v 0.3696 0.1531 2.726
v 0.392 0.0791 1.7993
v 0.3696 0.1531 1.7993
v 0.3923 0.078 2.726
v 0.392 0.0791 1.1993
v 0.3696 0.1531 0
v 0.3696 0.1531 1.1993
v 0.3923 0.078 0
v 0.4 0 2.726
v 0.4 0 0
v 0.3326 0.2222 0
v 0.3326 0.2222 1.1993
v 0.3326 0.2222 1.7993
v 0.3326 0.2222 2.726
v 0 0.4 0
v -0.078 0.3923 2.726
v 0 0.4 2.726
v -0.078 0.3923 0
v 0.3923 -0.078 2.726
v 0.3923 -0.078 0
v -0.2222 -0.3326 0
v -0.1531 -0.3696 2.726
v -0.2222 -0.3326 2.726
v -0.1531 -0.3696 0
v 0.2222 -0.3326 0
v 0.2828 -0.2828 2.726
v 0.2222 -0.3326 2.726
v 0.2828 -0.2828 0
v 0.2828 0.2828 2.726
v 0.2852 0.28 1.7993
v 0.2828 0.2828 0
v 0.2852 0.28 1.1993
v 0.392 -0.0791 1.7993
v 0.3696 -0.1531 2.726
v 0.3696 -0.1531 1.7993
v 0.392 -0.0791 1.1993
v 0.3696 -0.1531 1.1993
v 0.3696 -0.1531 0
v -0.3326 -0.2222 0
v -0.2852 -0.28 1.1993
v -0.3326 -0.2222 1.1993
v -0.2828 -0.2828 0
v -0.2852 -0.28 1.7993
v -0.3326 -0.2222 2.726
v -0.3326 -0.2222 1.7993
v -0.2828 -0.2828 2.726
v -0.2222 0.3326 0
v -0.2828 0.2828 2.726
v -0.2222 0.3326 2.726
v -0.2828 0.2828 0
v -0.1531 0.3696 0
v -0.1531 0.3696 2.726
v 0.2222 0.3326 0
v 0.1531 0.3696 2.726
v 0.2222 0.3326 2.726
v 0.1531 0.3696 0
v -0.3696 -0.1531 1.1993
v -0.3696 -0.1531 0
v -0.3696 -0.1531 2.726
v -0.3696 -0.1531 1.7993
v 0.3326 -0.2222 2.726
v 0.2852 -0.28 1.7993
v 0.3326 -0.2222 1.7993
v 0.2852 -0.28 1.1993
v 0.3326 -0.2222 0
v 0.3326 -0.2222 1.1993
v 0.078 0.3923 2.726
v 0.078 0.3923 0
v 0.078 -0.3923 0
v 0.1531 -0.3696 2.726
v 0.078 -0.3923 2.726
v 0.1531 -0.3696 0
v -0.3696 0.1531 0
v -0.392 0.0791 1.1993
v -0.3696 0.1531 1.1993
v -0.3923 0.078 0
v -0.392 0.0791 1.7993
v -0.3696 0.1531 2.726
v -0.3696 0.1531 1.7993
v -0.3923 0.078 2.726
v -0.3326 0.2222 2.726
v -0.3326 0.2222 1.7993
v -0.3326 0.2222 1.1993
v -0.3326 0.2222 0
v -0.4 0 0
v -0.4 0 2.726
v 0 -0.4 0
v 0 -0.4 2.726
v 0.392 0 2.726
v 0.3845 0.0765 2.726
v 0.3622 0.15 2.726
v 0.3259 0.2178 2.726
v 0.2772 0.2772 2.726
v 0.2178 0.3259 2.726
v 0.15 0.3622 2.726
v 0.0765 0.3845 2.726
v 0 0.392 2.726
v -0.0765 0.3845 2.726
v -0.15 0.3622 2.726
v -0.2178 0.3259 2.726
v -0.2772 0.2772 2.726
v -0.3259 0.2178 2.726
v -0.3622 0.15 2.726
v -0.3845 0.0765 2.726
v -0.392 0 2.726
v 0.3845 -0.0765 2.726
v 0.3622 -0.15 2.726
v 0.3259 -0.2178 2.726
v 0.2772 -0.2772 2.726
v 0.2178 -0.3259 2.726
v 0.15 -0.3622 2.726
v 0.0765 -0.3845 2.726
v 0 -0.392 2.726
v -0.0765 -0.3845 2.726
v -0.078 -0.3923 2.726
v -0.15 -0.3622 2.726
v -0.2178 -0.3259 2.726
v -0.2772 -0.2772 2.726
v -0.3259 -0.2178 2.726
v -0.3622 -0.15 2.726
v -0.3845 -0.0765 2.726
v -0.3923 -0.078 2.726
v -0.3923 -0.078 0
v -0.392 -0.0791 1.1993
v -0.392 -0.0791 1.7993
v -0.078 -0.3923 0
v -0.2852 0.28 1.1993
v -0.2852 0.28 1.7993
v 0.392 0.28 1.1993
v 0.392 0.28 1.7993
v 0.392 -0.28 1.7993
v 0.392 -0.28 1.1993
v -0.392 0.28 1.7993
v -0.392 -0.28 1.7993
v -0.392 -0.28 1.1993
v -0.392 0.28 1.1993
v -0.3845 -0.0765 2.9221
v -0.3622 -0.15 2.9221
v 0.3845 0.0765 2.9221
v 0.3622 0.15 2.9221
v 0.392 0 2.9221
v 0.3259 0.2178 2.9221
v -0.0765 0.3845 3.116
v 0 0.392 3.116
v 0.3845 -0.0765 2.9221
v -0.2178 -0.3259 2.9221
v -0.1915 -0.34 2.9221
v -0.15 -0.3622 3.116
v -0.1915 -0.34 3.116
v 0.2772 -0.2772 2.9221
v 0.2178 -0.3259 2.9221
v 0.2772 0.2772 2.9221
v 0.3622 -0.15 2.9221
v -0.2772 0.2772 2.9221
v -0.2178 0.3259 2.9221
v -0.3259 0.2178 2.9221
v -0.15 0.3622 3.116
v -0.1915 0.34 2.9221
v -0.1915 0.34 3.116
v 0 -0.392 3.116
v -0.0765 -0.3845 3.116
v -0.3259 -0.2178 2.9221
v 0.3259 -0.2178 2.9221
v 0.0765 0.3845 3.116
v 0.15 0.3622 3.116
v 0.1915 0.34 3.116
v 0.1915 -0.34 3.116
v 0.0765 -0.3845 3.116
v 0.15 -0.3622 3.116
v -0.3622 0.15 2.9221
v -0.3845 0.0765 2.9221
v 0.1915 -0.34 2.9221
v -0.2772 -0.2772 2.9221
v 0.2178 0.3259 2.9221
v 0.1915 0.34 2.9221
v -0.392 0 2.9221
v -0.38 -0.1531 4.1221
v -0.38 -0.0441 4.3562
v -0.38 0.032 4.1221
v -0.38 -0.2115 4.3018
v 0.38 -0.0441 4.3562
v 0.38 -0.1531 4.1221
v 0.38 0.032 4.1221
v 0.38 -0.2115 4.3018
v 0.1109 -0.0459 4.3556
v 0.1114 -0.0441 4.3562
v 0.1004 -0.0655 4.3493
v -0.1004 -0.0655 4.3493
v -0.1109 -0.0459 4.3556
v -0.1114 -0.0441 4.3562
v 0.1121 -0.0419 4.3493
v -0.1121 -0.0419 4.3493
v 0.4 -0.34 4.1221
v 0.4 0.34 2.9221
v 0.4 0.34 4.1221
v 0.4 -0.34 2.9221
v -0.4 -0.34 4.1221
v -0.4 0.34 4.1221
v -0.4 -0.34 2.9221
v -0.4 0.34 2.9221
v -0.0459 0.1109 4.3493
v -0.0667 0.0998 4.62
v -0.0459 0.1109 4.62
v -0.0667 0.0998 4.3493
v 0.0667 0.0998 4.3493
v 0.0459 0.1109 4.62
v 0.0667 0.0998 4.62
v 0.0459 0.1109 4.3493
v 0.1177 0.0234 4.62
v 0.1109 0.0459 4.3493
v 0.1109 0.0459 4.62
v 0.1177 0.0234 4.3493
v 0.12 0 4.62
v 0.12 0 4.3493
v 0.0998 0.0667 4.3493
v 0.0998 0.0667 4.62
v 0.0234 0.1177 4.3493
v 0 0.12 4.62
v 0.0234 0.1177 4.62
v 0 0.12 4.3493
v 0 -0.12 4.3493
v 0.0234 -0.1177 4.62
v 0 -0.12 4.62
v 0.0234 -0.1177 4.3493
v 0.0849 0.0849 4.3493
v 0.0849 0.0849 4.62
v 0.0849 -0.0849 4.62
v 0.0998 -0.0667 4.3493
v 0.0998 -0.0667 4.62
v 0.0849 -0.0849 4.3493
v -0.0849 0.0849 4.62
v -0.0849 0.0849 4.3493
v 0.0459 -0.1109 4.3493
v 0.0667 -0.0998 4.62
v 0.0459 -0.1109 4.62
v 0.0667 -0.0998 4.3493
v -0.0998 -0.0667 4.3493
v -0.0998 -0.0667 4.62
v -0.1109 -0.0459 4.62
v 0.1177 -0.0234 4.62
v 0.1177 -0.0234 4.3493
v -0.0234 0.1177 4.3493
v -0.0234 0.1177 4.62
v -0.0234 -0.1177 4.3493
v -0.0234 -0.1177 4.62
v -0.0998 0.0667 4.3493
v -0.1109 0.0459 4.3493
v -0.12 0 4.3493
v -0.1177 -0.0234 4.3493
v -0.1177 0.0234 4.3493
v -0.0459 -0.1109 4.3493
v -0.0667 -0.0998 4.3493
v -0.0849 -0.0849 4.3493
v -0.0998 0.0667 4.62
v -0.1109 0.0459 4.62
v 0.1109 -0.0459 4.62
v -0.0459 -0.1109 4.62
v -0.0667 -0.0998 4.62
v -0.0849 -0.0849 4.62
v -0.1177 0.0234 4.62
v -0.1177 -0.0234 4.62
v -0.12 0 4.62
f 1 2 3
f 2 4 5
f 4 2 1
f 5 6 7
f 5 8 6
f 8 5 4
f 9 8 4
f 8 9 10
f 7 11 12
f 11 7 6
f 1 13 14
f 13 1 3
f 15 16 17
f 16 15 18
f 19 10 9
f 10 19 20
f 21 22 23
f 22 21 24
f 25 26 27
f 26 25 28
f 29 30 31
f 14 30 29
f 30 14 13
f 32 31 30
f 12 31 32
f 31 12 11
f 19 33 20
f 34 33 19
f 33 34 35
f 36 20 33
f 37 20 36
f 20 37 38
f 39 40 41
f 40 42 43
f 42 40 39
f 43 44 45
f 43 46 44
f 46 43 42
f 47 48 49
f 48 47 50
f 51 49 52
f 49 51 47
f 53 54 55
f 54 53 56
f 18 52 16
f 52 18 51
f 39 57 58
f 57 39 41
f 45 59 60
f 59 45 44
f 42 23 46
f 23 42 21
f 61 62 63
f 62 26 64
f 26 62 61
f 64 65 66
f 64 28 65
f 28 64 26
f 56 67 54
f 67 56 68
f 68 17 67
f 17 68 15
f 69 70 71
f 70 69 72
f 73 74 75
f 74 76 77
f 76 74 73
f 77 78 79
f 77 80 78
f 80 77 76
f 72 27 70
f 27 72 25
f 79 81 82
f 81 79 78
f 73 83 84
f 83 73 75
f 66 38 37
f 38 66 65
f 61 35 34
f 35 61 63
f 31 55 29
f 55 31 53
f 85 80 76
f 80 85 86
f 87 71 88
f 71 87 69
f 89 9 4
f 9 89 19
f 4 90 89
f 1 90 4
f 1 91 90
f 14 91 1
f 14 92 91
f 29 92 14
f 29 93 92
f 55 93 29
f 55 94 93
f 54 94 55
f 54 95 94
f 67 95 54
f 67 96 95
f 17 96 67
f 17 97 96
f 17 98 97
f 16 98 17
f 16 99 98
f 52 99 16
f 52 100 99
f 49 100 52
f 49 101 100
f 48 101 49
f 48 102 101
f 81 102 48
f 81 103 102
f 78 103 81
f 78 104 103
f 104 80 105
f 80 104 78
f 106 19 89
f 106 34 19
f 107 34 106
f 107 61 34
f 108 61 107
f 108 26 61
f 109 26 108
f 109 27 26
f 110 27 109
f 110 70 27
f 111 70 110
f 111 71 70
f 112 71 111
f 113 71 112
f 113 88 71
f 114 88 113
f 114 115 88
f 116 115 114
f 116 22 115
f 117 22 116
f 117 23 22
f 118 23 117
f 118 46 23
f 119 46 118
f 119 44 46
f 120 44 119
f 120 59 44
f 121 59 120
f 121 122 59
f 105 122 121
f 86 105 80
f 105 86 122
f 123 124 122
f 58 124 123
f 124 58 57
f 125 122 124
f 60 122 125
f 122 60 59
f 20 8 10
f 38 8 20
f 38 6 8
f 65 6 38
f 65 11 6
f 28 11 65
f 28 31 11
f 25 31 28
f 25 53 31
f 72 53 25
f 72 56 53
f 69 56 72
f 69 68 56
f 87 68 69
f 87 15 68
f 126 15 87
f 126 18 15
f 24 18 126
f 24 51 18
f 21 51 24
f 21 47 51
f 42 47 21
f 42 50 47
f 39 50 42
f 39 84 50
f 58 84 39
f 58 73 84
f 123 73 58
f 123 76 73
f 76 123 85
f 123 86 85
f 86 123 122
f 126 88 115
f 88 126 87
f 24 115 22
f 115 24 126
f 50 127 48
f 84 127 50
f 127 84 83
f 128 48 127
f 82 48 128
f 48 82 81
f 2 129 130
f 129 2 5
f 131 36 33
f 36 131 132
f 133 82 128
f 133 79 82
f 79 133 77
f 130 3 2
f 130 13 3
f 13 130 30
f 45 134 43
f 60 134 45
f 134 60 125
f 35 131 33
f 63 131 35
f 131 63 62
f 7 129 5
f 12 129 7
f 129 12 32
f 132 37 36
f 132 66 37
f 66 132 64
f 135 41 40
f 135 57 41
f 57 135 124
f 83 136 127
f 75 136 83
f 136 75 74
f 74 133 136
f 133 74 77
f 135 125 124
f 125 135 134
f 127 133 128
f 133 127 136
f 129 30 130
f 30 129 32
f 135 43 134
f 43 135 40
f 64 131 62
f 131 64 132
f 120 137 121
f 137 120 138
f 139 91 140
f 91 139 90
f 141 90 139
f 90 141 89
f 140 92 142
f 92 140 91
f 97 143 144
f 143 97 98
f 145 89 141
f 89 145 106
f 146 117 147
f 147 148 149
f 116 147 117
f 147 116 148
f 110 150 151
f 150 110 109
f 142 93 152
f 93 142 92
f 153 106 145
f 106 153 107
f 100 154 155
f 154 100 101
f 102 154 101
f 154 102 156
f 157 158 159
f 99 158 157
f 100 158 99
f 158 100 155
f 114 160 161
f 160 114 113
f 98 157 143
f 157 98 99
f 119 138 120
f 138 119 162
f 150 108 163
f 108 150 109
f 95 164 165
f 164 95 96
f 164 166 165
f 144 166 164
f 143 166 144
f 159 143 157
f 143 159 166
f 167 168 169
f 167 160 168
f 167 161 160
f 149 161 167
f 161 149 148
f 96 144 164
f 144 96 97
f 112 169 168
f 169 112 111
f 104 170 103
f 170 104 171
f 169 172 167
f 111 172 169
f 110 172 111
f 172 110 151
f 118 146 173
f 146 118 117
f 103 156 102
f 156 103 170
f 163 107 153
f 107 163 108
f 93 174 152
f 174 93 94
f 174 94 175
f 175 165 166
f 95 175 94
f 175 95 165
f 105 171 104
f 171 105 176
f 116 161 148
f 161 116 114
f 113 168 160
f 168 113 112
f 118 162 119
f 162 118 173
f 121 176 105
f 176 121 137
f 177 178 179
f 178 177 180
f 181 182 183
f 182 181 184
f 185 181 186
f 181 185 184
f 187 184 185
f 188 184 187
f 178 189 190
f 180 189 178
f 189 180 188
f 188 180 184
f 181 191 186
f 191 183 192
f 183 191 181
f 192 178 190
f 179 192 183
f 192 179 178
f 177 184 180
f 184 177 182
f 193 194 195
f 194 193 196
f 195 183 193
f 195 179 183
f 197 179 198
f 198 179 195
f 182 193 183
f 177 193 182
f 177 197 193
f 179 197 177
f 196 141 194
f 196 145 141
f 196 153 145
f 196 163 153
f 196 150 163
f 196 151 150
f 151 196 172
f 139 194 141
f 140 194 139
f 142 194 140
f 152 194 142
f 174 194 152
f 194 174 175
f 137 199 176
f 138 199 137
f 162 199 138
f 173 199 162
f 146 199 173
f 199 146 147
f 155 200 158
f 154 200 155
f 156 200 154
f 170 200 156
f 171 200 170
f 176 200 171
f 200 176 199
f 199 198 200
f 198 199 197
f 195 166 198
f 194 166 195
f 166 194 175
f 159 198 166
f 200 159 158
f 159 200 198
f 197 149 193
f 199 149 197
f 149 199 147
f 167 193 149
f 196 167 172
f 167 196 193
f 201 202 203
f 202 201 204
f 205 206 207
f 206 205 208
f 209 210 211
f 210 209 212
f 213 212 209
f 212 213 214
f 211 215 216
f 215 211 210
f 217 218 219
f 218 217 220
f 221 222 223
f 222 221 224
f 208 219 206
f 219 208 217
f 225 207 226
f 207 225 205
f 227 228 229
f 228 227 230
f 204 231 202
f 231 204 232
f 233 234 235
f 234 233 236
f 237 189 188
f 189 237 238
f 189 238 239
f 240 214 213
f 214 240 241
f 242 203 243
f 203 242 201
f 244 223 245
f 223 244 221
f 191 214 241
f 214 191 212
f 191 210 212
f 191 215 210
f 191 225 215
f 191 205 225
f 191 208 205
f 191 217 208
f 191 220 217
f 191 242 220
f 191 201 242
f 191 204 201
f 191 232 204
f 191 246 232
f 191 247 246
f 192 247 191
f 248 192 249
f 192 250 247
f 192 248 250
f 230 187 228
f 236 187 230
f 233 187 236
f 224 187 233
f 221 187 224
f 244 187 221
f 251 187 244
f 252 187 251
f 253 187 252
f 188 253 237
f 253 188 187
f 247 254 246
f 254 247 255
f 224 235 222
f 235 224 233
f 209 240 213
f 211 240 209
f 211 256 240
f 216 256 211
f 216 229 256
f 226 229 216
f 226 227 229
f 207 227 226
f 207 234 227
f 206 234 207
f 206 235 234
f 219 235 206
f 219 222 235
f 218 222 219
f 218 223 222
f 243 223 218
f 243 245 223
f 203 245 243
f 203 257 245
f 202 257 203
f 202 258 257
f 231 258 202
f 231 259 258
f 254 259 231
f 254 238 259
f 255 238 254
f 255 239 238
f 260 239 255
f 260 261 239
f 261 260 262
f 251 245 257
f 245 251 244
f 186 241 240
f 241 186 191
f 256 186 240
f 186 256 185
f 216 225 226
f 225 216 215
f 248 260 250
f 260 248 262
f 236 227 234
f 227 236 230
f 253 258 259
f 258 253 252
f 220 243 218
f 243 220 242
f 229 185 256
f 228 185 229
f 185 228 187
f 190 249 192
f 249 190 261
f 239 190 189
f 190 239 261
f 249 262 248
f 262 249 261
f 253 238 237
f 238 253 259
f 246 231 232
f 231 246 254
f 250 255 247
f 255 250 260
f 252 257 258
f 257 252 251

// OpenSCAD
// Toggle switch (miniature) - ONE connected solid
// Target: 0.8mm body diameter, 4.7mm overall height
// Connectivity fix: ensure paddle/caps are physically attached to the main body
// by adding a small "bridge" block that overlaps both the body and the paddle.

$fn = 32;

// Targets (do not change)
body_diameter_mm   = 0.8;  //[0.4:1.6:0.01]
overall_height_mm  = 4.7;  //[2.35:9.4:0.01]

// Connectivity / shaping
connect_overlap_mm = 0.08; //[0.02:0.2:0.01]

// Derived
body_r = body_diameter_mm/2;

// Height allocation (sum = overall_height_mm)
base_h   = overall_height_mm * 0.58;                 // main body height
collar_h = max(0.10, overall_height_mm * 0.10);      // small collar
lever_h  = overall_height_mm - base_h - collar_h;    // remaining for lever

// Radii (keep within 0.8mm max diameter envelope)
collar_r = body_r * 0.98;
lever_r  = body_r * 0.28;

// Toggle-specific silhouette: a "paddle" lever (not just a pin)
paddle_w = body_diameter_mm * 0.95;  // X
paddle_t = body_diameter_mm * 0.22;  // Y (thin)
paddle_h = lever_h * 0.55;           // Z portion of lever that is paddle-like

// Small rounded-ish tip at top of lever (kept simple)
tip_r = min(body_r * 0.30, lever_r * 1.15);
tip_h = max(0.12, lever_h * 0.18);

module toggle() {
    union() {
        // Main cylindrical body
        translate([0,0, base_h/2])
            cylinder(r=body_r, h=base_h, center=true);

        // Subtle housing bulge (simplified: plain box instead of rounded hull)
        housing_h = min(base_h * 0.55, body_diameter_mm * 0.75);
        housing_w = body_diameter_mm * 0.98; // X
        housing_d = body_diameter_mm * 0.70; // Y
        translate([0,0, base_h*0.55])
            cube([housing_w, housing_d, housing_h], center=true);

        // Collar under lever (connected)
        translate([0,0, base_h + collar_h/2 - connect_overlap_mm])
            cylinder(r=collar_r, h=collar_h, center=true);

        // Lever stem (connected)
        stem_h = max(0.10, lever_h - paddle_h - tip_h);
        translate([0,0, base_h + collar_h + stem_h/2 - connect_overlap_mm])
            cylinder(r=lever_r, h=stem_h, center=true);

        // Paddle lever section (connected), slight forward tilt
        paddle_z0 = base_h + collar_h + stem_h - connect_overlap_mm;
        translate([0,0, paddle_z0 + paddle_h/2])
            rotate([18,0,0])
                cube([paddle_w, paddle_t, paddle_h], center=true);

        // --- Connectivity bridge (FIX) ---
        // The rotated paddle can end up only touching via the thin stem.
        // Add a small block that overlaps the body/collar region and the paddle,
        // guaranteeing a solid connection (1-2mm overlap requirement).
        //
        // Place it centered at the paddle base height, and make it thick enough in Y
        // to intersect the cylinder even with the 18° tilt.
        bridge_h = max(1.2, paddle_h * 0.55);                 // >= ~1.2mm overlap in Z
        bridge_w = max(paddle_w * 0.70, body_diameter_mm);    // spans across the body
        bridge_t = max(body_diameter_mm * 0.85, paddle_t*3);  // reaches into cylinder in Y

        // Center the bridge so its bottom overlaps the collar/stem region
        // and its top overlaps the paddle.
        bridge_zc = paddle_z0 + bridge_h/2 - 0.6; // ~0.6mm downward bias for overlap into collar/stem
        translate([0,0, bridge_zc])
            cube([bridge_w, bridge_t, bridge_h], center=true);

        // Tip/knob (connected)
        tip_z0 = base_h + collar_h + stem_h + paddle_h - connect_overlap_mm;
        translate([0,0, tip_z0 + tip_h/2])
            cylinder(r=tip_r, h=tip_h, center=true);
    }
}

toggle();
